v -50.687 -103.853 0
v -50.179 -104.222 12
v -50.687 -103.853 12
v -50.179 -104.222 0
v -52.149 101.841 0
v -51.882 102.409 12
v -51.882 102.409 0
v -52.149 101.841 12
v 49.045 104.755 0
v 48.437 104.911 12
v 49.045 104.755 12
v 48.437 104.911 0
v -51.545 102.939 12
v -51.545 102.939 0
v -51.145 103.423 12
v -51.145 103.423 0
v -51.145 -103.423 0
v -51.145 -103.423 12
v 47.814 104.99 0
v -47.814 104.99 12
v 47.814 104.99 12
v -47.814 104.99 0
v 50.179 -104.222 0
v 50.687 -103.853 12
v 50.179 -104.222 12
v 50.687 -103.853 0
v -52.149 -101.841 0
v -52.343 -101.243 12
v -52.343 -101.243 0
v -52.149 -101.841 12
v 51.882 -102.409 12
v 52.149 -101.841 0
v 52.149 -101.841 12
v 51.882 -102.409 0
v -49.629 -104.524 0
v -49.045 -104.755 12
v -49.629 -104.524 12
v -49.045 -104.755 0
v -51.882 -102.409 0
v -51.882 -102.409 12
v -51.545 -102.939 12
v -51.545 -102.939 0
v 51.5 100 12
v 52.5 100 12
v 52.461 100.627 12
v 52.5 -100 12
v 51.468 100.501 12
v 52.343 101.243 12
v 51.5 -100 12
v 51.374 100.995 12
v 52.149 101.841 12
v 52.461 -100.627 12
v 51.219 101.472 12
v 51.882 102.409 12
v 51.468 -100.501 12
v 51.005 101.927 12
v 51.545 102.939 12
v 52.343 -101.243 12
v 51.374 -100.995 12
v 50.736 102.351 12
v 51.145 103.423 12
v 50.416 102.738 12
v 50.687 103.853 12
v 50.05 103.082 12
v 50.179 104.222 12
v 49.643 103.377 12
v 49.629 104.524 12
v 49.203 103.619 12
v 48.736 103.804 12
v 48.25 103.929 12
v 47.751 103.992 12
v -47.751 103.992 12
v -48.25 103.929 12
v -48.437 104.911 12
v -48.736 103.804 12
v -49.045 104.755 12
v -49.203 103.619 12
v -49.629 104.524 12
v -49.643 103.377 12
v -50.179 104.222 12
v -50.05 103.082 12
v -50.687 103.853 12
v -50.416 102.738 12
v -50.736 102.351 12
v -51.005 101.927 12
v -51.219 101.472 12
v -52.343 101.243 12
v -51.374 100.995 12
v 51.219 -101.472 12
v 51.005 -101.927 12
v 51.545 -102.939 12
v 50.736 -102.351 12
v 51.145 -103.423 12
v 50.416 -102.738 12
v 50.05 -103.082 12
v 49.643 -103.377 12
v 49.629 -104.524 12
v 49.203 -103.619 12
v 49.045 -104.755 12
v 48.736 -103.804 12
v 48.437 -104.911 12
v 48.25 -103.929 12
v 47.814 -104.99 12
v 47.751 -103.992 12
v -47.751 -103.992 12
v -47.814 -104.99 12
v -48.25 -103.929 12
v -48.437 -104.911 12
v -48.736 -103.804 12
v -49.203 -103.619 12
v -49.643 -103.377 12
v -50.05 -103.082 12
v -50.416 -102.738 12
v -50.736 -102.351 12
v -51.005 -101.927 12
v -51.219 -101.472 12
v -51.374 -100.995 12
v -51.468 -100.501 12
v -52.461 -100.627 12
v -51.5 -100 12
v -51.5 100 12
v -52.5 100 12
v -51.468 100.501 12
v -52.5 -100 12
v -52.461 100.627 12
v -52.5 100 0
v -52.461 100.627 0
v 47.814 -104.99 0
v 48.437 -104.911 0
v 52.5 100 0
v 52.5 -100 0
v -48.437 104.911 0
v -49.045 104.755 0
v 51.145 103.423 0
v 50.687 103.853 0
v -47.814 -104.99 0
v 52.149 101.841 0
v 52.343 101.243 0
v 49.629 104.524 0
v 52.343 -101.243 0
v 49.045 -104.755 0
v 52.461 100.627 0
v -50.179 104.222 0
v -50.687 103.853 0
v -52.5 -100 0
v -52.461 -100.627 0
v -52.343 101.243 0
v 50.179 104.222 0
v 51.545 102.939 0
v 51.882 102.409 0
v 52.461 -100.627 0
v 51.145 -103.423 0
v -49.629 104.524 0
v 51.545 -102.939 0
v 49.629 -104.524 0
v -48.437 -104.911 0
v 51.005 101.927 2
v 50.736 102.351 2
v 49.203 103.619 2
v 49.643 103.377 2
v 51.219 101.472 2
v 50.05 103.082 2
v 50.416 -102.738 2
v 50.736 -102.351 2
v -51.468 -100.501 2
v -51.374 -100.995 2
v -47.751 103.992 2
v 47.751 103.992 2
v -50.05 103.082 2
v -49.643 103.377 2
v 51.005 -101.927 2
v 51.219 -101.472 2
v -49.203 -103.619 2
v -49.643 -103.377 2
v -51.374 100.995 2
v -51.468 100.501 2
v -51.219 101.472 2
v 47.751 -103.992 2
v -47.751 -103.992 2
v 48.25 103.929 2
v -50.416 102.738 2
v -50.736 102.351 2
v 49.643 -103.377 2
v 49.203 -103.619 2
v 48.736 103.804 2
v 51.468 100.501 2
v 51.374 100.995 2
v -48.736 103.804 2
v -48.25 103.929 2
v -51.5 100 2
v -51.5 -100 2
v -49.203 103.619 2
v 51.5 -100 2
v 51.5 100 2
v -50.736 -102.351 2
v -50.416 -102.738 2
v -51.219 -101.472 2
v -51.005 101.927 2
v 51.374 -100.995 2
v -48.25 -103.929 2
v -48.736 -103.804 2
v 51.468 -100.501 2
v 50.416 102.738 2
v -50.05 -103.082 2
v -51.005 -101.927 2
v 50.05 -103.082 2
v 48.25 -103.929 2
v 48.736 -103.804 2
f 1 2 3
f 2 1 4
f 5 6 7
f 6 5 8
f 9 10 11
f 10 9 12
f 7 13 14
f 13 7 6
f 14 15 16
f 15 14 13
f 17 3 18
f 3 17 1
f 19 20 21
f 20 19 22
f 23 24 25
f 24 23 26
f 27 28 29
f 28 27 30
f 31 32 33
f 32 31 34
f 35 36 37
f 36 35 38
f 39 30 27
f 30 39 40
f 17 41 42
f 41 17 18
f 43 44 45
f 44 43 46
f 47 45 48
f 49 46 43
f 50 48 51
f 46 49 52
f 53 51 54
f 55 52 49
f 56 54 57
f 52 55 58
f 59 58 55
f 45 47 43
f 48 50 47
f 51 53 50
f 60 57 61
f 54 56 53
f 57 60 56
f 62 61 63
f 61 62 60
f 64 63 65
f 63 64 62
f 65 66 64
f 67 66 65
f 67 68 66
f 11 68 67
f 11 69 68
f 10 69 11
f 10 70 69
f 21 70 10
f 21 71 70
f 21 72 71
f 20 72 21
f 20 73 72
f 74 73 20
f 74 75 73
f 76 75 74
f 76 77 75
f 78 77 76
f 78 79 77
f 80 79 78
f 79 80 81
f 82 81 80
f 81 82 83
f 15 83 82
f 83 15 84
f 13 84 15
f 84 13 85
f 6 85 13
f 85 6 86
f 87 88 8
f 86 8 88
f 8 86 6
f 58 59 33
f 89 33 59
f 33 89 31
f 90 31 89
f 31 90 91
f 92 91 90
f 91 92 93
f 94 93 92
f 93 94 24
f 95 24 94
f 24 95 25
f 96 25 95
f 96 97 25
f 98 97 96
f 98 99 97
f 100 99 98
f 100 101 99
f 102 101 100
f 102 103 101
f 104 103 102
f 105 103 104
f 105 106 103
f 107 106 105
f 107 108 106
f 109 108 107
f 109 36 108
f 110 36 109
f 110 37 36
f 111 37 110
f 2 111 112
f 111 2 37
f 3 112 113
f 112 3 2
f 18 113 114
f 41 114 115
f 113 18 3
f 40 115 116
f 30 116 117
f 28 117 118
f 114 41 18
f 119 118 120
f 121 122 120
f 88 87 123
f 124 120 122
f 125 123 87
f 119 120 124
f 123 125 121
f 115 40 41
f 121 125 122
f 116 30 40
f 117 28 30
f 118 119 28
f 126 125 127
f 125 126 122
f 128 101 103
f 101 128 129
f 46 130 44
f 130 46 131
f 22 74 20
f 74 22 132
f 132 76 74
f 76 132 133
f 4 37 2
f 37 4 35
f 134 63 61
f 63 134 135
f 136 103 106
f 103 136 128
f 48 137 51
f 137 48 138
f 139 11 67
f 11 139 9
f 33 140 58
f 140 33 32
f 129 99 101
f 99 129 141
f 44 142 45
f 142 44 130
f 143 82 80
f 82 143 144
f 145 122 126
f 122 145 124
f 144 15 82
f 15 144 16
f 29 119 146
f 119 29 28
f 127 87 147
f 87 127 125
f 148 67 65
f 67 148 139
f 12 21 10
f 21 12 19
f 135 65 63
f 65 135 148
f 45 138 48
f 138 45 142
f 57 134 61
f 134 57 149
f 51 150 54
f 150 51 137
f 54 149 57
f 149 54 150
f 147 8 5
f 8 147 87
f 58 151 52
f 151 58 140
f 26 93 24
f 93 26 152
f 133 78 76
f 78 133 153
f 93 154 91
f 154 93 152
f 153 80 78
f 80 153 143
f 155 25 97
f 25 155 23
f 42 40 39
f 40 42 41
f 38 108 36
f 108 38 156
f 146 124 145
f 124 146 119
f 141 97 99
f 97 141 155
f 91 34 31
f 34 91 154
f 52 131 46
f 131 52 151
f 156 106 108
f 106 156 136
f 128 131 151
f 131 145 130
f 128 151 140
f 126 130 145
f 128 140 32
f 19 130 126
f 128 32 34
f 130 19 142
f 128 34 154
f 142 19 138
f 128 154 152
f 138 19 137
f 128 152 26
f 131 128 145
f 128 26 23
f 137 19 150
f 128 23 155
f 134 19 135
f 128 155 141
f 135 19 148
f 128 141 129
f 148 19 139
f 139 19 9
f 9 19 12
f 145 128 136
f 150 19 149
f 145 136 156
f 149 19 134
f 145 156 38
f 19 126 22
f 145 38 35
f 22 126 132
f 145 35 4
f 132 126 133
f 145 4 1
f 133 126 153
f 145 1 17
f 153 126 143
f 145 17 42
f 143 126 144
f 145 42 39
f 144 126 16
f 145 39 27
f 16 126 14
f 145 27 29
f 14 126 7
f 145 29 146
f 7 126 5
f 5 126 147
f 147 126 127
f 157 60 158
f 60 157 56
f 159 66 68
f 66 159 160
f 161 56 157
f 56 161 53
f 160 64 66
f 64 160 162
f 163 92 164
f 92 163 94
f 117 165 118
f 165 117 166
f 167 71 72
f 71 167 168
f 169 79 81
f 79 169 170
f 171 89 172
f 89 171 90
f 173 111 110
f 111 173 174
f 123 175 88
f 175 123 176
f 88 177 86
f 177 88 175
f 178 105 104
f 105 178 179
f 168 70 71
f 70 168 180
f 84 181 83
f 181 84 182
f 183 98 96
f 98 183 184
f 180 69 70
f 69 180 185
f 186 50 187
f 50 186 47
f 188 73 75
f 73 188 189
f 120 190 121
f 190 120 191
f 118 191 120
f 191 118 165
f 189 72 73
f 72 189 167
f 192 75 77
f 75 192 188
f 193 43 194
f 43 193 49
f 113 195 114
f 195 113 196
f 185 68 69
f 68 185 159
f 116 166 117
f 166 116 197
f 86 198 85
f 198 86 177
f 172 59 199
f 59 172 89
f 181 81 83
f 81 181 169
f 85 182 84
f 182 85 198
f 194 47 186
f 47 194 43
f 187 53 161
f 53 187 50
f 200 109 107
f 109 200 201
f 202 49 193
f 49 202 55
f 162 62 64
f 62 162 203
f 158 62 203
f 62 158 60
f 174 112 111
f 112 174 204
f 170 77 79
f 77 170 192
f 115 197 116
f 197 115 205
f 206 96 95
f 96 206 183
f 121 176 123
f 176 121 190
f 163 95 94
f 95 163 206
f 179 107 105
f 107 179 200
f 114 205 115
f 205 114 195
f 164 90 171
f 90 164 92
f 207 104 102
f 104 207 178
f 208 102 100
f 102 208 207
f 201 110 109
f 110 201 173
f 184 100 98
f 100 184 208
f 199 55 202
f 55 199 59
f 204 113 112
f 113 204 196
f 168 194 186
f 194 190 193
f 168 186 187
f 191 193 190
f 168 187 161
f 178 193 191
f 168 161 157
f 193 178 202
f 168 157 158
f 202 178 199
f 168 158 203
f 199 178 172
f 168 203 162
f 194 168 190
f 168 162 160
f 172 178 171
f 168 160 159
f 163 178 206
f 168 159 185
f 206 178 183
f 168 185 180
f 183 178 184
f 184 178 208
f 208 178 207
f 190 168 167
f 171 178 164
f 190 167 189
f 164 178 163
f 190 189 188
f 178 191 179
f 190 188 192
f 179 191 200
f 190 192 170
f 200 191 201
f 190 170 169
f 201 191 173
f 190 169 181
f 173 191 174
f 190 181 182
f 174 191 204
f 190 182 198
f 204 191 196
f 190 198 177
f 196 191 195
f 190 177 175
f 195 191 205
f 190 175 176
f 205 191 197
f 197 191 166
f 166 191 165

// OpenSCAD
$fn = 50;


difference() {
	union() {
		hull() {
			translate(v = [-47.5000000000, 100.0000000000, 0]) {
				cylinder(h = 12, r = 5);
			}
			translate(v = [47.5000000000, 100.0000000000, 0]) {
				cylinder(h = 12, r = 5);
			}
			translate(v = [-47.5000000000, -100.0000000000, 0]) {
				cylinder(h = 12, r = 5);
			}
			translate(v = [47.5000000000, -100.0000000000, 0]) {
				cylinder(h = 12, r = 5);
			}
		}
	}
	union() {
		translate(v = [0, 0, 2]) {
			hull() {
				translate(v = [-47.5000000000, 100.0000000000, 0]) {
					cylinder(h = 10, r = 4);
				}
				translate(v = [47.5000000000, 100.0000000000, 0]) {
					cylinder(h = 10, r = 4);
				}
				translate(v = [-47.5000000000, -100.0000000000, 0]) {
					cylinder(h = 10, r = 4);
				}
				translate(v = [47.5000000000, -100.0000000000, 0]) {
					cylinder(h = 10, r = 4);
				}
			}
		}
	}
}
